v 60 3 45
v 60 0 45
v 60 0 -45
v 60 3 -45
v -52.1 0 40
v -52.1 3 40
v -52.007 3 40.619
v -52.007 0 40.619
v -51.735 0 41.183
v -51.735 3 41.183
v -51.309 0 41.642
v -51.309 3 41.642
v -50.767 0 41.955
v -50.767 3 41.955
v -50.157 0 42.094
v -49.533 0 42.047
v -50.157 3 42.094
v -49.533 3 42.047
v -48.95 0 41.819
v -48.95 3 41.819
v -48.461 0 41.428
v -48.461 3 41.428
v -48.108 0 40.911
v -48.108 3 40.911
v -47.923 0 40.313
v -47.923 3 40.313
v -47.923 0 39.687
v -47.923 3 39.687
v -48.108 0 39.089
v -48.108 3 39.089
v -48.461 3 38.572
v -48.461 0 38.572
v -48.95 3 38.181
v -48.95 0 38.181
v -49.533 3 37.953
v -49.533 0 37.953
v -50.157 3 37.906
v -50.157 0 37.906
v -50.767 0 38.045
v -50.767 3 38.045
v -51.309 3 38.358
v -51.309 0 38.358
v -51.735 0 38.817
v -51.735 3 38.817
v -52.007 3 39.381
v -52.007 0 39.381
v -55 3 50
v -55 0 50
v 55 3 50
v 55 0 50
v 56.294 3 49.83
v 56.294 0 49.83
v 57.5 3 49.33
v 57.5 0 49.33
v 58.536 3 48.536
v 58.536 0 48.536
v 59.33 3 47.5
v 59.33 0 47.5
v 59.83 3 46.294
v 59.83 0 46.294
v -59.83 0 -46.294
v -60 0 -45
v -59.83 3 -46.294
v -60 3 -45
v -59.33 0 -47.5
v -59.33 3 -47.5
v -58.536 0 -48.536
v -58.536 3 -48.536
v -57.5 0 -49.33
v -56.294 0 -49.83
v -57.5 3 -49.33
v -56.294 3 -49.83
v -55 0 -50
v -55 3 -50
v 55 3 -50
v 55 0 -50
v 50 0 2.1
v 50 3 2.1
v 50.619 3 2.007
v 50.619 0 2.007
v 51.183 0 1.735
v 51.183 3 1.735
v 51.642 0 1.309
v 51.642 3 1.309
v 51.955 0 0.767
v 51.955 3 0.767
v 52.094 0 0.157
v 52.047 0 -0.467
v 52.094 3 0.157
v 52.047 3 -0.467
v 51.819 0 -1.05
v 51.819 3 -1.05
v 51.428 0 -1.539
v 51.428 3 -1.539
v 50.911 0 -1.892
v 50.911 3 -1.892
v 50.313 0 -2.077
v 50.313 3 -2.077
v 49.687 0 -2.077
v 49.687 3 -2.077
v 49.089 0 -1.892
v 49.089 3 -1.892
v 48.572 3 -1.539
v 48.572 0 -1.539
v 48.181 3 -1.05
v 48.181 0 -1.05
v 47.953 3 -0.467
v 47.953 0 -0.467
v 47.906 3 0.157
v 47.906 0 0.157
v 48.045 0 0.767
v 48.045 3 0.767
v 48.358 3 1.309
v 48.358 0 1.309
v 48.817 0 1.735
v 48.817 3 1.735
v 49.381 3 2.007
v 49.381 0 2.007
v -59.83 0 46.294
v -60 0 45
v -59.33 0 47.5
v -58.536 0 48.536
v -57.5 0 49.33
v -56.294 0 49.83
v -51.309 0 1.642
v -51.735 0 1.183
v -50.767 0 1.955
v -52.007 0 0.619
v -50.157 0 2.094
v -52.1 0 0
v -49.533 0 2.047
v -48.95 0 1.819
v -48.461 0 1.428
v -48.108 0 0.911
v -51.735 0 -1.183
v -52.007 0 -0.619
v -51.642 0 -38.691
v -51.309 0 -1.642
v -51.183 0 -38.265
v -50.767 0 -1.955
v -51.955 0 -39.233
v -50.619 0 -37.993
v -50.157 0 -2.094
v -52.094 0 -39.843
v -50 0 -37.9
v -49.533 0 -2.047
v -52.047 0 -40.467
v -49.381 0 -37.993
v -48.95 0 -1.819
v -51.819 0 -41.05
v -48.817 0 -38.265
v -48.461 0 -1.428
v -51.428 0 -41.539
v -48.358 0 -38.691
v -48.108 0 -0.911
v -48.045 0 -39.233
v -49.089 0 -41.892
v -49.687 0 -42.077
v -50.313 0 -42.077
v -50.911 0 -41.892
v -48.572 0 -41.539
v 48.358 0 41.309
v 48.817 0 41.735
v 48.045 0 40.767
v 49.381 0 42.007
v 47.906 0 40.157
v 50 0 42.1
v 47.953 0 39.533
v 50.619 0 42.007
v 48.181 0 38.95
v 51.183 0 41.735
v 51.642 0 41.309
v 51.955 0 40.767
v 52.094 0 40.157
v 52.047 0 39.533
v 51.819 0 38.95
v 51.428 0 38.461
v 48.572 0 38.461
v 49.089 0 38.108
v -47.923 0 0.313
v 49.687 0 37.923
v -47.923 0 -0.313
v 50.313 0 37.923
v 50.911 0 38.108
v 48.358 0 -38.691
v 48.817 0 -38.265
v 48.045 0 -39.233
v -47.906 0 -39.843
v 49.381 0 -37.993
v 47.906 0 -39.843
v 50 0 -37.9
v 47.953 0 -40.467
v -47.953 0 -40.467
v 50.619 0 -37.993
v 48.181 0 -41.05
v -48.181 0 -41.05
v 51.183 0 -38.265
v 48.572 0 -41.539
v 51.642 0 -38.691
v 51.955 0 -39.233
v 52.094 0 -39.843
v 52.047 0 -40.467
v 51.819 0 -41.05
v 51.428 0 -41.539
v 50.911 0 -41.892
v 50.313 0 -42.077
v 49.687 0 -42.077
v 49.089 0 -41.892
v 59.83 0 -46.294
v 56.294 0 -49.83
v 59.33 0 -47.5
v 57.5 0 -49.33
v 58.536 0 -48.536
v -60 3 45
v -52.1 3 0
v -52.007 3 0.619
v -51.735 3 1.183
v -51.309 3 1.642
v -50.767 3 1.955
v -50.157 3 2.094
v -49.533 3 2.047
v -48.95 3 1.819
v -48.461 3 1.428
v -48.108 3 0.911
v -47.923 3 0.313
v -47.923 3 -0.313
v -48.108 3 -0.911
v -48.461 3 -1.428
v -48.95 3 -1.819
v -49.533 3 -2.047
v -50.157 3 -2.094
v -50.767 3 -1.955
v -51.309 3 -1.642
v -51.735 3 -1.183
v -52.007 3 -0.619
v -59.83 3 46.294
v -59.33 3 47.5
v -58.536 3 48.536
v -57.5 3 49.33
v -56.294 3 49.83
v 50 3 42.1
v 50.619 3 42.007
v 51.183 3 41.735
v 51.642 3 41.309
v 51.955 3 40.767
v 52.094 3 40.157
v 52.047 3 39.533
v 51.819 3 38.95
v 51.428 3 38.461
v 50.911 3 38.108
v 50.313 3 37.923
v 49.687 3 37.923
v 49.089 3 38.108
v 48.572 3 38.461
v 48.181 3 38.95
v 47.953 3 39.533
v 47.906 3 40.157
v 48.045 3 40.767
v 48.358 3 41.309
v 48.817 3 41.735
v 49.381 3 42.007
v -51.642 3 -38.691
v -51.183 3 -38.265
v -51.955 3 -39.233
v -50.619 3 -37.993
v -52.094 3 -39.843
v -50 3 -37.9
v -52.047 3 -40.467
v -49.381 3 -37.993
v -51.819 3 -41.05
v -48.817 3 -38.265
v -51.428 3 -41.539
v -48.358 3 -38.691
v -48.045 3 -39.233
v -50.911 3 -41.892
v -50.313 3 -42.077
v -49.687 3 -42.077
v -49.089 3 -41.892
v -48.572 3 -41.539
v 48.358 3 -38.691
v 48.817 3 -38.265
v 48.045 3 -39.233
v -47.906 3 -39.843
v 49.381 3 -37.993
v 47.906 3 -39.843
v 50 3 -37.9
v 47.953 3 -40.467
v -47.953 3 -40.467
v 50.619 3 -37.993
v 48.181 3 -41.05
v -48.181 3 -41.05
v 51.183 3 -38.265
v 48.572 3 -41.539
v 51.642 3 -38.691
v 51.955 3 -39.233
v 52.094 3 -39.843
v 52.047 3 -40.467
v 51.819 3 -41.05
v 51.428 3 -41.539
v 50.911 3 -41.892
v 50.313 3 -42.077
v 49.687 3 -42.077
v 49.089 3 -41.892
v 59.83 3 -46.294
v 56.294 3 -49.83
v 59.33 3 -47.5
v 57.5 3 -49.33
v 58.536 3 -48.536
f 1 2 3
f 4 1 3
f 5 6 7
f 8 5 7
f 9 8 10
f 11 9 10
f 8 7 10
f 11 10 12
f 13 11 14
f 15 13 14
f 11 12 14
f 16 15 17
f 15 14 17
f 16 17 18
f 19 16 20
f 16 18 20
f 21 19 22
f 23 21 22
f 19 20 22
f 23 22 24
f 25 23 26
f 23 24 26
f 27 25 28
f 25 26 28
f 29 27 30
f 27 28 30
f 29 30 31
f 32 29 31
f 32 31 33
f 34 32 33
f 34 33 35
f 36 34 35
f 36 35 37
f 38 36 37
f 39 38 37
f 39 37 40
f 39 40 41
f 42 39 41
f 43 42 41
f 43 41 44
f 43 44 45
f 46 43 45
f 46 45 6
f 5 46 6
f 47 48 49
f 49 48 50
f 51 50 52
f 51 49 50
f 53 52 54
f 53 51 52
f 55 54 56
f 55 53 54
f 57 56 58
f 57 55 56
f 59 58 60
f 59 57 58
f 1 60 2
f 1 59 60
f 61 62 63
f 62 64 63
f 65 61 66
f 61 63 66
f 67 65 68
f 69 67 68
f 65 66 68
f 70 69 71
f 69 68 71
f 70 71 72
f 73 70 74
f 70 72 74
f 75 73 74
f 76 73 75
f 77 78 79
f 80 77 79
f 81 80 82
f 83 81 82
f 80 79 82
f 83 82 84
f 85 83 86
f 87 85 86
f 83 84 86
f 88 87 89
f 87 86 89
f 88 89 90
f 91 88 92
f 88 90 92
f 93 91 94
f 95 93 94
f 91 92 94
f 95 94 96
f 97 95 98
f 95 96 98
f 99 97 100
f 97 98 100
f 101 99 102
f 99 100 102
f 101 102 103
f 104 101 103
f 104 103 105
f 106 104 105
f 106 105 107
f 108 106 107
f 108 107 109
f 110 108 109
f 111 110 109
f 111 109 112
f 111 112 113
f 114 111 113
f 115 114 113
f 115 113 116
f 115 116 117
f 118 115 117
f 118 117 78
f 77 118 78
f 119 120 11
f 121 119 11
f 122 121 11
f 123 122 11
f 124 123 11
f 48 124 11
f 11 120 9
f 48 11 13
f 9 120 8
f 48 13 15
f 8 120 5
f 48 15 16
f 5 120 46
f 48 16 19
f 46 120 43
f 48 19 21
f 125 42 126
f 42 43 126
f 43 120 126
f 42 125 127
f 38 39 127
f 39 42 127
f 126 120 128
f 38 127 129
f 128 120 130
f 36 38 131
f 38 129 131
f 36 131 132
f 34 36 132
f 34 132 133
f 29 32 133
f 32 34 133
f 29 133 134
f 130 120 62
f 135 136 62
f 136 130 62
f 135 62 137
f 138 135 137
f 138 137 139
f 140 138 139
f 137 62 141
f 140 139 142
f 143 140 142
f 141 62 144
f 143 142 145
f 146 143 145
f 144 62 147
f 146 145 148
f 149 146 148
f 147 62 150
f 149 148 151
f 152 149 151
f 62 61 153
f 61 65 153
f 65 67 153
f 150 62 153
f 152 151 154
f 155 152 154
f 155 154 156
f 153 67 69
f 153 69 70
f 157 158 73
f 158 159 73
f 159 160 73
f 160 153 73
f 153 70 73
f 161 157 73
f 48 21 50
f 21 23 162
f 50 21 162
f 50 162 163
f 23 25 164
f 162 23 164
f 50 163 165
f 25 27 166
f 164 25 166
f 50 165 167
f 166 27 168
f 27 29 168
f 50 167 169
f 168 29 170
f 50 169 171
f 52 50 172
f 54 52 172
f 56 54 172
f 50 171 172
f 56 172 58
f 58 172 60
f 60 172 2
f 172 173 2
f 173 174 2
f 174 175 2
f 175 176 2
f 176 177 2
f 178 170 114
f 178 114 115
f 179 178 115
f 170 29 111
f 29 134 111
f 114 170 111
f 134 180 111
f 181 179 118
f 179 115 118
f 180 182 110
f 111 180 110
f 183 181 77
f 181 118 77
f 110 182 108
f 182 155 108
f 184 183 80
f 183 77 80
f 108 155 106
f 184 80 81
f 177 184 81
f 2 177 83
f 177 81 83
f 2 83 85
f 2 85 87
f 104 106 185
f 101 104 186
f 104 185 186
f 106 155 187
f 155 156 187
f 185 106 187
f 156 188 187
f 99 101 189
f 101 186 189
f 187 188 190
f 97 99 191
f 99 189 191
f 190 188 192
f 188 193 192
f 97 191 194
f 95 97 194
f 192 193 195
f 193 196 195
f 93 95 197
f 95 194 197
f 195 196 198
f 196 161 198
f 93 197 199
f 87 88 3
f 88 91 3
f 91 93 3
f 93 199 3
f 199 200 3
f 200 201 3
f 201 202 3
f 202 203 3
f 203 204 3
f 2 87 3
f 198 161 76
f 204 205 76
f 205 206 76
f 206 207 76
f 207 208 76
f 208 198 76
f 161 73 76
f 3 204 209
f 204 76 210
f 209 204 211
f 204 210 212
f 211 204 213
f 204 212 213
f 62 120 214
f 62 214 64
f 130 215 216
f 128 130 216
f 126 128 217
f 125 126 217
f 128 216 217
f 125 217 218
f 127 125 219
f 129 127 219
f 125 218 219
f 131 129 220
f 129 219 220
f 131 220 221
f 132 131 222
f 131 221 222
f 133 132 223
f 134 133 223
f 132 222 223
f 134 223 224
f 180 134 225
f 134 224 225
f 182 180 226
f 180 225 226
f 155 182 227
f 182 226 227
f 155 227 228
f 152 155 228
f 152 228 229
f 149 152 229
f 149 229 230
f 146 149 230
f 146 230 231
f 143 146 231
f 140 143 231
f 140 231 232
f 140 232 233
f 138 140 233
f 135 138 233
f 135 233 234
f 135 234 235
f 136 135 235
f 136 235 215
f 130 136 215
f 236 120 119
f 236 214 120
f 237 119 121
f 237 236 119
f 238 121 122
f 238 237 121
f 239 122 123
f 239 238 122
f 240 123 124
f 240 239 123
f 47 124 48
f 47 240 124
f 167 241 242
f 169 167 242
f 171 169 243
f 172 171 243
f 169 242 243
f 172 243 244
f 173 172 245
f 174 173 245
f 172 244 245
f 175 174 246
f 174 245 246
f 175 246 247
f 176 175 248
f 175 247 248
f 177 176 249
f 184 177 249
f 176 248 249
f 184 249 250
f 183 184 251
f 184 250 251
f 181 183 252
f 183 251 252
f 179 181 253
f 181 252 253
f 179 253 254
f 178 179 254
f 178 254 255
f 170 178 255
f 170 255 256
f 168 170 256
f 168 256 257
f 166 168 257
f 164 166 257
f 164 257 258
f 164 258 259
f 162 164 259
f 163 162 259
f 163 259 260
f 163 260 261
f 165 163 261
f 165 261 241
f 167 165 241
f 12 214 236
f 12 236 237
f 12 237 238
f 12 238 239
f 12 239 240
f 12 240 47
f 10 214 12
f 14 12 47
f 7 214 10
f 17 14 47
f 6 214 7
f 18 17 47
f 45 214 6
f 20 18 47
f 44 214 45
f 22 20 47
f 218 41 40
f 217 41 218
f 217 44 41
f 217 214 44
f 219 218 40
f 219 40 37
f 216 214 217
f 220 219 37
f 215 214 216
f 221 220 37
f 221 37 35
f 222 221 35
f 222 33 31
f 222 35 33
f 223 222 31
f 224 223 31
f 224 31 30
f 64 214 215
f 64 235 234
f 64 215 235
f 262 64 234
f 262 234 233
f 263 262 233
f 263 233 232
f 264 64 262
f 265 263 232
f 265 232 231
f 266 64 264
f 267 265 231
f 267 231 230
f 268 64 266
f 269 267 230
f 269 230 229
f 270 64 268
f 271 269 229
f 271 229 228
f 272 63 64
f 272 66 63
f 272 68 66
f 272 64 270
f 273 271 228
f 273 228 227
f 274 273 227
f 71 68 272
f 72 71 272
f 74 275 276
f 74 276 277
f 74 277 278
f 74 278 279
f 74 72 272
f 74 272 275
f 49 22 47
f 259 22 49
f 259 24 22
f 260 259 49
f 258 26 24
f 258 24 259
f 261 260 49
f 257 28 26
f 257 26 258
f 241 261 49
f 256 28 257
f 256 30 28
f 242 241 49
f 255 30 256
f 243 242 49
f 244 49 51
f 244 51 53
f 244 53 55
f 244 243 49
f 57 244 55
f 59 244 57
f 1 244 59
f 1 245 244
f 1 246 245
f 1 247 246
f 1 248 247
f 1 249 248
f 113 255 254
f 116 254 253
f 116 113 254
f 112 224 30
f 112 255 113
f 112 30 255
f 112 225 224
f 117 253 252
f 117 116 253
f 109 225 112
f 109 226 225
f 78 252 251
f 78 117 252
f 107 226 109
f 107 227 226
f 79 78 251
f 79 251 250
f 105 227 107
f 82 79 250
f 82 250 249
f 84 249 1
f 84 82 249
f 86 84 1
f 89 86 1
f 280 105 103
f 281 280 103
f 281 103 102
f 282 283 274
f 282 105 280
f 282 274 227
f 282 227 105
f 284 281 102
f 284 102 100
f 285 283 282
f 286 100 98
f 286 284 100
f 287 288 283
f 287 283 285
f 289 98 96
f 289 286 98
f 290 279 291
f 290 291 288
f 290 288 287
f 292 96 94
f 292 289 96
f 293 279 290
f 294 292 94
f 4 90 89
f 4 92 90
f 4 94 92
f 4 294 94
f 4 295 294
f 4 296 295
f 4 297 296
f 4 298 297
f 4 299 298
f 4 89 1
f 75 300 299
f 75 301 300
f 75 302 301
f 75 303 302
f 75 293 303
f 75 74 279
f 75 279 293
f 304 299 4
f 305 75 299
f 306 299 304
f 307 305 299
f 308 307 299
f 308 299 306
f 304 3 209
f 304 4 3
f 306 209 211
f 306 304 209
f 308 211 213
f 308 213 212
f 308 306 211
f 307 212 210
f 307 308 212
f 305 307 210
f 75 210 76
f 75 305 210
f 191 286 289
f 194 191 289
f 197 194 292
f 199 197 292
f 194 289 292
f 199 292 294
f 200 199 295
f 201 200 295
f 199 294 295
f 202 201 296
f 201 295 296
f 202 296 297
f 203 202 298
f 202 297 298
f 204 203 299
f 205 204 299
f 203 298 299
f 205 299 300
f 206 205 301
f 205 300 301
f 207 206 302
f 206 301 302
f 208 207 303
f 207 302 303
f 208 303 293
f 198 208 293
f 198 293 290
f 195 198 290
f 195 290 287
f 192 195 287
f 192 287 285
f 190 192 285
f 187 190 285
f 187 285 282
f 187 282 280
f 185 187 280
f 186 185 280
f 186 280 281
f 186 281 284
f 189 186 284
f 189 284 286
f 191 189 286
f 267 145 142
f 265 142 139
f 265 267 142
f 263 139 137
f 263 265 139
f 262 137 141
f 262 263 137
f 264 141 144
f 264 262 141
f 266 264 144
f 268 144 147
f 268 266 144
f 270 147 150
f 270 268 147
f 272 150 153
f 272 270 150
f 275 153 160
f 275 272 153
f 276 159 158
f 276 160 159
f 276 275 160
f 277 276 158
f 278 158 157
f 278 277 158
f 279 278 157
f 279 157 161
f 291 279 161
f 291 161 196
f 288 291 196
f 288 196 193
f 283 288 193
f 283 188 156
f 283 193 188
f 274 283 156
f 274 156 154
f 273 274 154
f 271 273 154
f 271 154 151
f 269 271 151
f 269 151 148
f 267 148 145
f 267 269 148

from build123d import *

# Parameters (mm, degrees)
SKETCH_1_W               = 120
SKETCH_1_H               = 100
EXTRUDE_1_DEPTH          = 3
FILLET_1_R               = 5
SKETCH_4_R               = 2.1
CUT_EXTRUDE_2_DEPTH      = 79.160092119
PATTERN_LINEAR_1_COUNT   = 3
PATTERN_LINEAR_1_PITCH   = 40
MIRROR_1_COPY_1_SKETCH_R = 2.1
MIRROR_1_COPY_1_DEPTH    = 79.160092119
MIRROR_1_COPY_2_SKETCH_R = 2.1
MIRROR_1_COPY_2_DEPTH    = 79.160092119


with BuildPart() as part:
    # 草图1 → 凸台-拉伸1 (new body)
    with BuildSketch(Plane(origin=(0, 0, 0), x_dir=(1, 0, 0), z_dir=(0, 1, 0))):
        Rectangle(SKETCH_1_W, SKETCH_1_H)
    extrude(amount=EXTRUDE_1_DEPTH)

    # 圆角1
    fillet_1_edges = [part.edges().sort_by_distance(p)[0] for p in [
        (60, 1.5, 50),
        (-60, 1.5, 50),
        (-60, 1.5, -50),
        (60, 1.5, -50),
    ]]
    fillet(fillet_1_edges, radius=FILLET_1_R)

    # 草图4 → 切除-拉伸2 (cut, through all)
    with BuildSketch(Plane(origin=(0, 3, 0), x_dir=(1, 0, 0), z_dir=(0, 1, 0))):
        with Locations(Location((50, 40, 0), (0, 0, 270))):
            Circle(SKETCH_4_R)
    cut_extrude_2 = extrude(amount=-CUT_EXTRUDE_2_DEPTH, mode=Mode.SUBTRACT)

    # 阵列(线性)1: 切除-拉伸2 ×3
    with Locations(*[(0, 0, i * PATTERN_LINEAR_1_PITCH) for i in range(1, PATTERN_LINEAR_1_COUNT)]):
        add(cut_extrude_2, mode=Mode.SUBTRACT)

    # 镜向1: 切除-拉伸2 across plane
    add(cut_extrude_2.mirror(Plane(origin=(0, 0, 0), x_dir=(0, 0, 1), z_dir=(1, 0, 0))), mode=Mode.SUBTRACT)

    # 镜向1 copy 1 sketch → 镜向1 copy 1 (cut, through all)
    with BuildSketch(Plane(origin=(0, 3, 40), x_dir=(-1, 0, 0), z_dir=(0, 1, 0))):
        with Locations((50, -40)):
            Circle(MIRROR_1_COPY_1_SKETCH_R)
    extrude(amount=-MIRROR_1_COPY_1_DEPTH, mode=Mode.SUBTRACT)

    # 镜向1 copy 2 sketch → 镜向1 copy 2 (cut, through all)
    with BuildSketch(Plane(origin=(0, 3, 80), x_dir=(-1, 0, 0), z_dir=(0, 1, 0))):
        with Locations((50, -40)):
            Circle(MIRROR_1_COPY_2_SKETCH_R)
    extrude(amount=-MIRROR_1_COPY_2_DEPTH, mode=Mode.SUBTRACT)


solid = part.part
